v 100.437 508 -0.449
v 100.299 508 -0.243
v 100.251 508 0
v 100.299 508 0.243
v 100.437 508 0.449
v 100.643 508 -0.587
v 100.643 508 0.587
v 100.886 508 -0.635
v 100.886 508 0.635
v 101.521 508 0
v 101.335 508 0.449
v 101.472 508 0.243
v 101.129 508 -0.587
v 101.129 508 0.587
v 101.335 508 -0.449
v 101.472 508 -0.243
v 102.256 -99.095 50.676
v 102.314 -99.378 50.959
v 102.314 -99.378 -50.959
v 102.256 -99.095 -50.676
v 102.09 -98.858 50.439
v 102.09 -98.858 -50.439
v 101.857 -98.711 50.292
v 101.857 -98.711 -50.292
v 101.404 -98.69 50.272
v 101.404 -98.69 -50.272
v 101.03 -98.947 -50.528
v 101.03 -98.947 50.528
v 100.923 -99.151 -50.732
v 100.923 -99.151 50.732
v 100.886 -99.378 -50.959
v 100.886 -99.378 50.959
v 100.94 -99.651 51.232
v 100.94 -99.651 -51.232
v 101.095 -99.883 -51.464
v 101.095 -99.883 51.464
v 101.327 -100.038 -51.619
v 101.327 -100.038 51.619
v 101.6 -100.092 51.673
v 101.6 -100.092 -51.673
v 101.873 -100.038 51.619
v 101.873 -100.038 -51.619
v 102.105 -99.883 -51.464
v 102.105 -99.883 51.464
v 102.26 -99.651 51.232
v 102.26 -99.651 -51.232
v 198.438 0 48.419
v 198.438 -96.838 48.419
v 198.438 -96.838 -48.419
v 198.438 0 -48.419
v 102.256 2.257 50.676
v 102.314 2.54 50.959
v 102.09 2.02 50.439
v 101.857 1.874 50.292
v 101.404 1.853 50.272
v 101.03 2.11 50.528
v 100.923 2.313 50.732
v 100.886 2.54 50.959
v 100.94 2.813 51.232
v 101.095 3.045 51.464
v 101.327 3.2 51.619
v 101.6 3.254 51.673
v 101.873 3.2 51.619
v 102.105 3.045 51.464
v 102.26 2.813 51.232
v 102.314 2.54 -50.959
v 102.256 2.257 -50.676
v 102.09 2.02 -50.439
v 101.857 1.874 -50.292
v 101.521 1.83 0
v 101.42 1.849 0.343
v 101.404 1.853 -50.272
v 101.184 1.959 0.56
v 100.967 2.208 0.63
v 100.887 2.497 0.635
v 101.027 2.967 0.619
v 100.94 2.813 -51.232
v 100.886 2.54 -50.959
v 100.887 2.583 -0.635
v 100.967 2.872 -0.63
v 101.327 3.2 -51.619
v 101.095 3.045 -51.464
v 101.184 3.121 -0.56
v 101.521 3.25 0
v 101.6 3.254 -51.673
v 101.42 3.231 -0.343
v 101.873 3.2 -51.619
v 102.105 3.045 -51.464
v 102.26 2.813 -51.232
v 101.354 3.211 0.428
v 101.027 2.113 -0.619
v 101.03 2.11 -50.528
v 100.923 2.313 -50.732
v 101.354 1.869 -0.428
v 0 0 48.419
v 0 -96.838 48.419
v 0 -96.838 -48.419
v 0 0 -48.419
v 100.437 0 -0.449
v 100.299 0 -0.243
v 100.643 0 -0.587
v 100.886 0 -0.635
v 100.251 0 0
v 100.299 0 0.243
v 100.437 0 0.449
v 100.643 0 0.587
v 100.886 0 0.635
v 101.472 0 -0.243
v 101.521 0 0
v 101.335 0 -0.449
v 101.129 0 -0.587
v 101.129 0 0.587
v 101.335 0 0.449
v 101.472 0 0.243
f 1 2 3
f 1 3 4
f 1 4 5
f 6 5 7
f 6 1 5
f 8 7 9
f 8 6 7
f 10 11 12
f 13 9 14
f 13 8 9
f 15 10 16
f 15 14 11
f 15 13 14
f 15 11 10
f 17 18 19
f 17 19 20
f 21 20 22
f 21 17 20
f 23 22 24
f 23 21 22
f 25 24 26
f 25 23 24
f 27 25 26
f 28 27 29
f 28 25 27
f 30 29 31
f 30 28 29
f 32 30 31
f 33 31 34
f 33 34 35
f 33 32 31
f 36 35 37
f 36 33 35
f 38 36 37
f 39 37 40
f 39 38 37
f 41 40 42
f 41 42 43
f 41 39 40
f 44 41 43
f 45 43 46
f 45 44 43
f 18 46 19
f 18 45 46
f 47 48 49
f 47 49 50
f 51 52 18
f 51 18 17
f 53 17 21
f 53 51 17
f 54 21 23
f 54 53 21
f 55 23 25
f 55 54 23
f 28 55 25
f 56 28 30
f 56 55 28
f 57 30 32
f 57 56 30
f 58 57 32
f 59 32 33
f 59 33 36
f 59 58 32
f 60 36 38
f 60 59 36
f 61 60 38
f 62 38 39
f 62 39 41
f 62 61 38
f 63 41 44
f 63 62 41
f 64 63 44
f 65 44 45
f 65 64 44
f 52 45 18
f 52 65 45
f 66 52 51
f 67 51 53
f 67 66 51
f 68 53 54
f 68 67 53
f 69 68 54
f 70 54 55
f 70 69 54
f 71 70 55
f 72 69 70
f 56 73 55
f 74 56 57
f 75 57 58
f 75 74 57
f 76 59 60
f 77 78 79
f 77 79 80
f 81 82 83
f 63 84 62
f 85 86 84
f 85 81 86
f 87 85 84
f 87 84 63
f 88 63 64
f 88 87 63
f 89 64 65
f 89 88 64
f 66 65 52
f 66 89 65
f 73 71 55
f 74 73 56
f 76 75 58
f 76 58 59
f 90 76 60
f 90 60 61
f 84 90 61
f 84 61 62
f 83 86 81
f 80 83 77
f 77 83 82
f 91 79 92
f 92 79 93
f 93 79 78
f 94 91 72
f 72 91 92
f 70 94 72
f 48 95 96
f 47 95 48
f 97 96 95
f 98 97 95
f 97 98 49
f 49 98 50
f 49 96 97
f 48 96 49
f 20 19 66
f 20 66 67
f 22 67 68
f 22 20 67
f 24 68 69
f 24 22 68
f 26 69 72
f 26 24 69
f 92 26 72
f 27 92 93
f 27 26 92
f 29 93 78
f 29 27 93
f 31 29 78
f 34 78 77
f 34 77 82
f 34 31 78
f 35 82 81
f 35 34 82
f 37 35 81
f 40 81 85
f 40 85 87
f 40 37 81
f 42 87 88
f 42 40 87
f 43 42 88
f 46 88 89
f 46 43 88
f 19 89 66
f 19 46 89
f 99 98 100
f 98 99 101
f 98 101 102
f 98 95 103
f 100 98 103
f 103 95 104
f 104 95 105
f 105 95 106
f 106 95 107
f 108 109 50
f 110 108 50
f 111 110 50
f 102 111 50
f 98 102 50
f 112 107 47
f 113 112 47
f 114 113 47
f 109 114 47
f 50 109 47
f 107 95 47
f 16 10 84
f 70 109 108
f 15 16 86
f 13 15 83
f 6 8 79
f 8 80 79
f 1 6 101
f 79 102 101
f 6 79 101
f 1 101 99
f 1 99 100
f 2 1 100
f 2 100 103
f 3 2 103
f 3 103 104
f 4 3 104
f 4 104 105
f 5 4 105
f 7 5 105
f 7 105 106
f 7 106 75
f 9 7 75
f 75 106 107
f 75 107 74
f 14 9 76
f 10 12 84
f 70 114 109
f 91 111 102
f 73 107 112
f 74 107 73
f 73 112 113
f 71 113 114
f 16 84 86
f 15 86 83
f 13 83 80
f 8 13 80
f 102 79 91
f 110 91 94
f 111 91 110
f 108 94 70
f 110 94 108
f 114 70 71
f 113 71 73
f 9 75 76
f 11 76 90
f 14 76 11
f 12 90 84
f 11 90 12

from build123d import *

# Parameters (mm, degrees)
SKETCH1_W                = 198.4375
SKETCH1_H                = 96.8375
EXTRUDE1_DEPTH           = 48.41875
ESBO_O2_R                = 0.714449934
ESBO_O3_R                = 0.635
RESSALTO_EXTRUS_O1_DEPTH = 508


with BuildPart() as part:
    # Sketch1 → Extrude1 (new body, symmetric)
    with BuildSketch(Plane.XY):
        with Locations((99.21875, -48.41875)):
            Rectangle(SKETCH1_W, SKETCH1_H)
    extrude(amount=EXTRUDE1_DEPTH, both=True)



with BuildPart() as body_2:
    # Varredura1: sweep along a path in Esboço1
    with BuildLine(Plane(origin=(101.6, 0, 0), x_dir=(0, 0, -1), z_dir=(1, 0, 0))) as varredura1_path:
        Line((-50.95875, 2.54), (50.95875, 2.54))
        Line((50.95875, 2.54), (50.95875, -99.3775))
        Line((50.95875, -99.3775), (-50.95875, -99.3775))
        Line((-50.95875, -99.3775), (-50.95875, 2.54))
    # Esboço2 → Varredura1 (sweep)
    with BuildSketch(Plane.XY):
        with Locations((101.6, 2.54)):
            Circle(ESBO_O2_R)
    sweep(path=varredura1_path.line, transition=Transition.RIGHT)


with BuildPart() as part_1:
    add(part.part)

    add(body_2.part)  # Ressalto-extrusão1 merges body 2
    # Esboço3 → Ressalto-extrusão1 (add)
    with BuildSketch(Plane(origin=(0, 0, 0), x_dir=(1, 0, 0), z_dir=(0, 1, 0))):
        with Locations((100.885550066, 0)):
            Circle(ESBO_O3_R)
    extrude(amount=RESSALTO_EXTRUS_O1_DEPTH)


solid = part_1.part
